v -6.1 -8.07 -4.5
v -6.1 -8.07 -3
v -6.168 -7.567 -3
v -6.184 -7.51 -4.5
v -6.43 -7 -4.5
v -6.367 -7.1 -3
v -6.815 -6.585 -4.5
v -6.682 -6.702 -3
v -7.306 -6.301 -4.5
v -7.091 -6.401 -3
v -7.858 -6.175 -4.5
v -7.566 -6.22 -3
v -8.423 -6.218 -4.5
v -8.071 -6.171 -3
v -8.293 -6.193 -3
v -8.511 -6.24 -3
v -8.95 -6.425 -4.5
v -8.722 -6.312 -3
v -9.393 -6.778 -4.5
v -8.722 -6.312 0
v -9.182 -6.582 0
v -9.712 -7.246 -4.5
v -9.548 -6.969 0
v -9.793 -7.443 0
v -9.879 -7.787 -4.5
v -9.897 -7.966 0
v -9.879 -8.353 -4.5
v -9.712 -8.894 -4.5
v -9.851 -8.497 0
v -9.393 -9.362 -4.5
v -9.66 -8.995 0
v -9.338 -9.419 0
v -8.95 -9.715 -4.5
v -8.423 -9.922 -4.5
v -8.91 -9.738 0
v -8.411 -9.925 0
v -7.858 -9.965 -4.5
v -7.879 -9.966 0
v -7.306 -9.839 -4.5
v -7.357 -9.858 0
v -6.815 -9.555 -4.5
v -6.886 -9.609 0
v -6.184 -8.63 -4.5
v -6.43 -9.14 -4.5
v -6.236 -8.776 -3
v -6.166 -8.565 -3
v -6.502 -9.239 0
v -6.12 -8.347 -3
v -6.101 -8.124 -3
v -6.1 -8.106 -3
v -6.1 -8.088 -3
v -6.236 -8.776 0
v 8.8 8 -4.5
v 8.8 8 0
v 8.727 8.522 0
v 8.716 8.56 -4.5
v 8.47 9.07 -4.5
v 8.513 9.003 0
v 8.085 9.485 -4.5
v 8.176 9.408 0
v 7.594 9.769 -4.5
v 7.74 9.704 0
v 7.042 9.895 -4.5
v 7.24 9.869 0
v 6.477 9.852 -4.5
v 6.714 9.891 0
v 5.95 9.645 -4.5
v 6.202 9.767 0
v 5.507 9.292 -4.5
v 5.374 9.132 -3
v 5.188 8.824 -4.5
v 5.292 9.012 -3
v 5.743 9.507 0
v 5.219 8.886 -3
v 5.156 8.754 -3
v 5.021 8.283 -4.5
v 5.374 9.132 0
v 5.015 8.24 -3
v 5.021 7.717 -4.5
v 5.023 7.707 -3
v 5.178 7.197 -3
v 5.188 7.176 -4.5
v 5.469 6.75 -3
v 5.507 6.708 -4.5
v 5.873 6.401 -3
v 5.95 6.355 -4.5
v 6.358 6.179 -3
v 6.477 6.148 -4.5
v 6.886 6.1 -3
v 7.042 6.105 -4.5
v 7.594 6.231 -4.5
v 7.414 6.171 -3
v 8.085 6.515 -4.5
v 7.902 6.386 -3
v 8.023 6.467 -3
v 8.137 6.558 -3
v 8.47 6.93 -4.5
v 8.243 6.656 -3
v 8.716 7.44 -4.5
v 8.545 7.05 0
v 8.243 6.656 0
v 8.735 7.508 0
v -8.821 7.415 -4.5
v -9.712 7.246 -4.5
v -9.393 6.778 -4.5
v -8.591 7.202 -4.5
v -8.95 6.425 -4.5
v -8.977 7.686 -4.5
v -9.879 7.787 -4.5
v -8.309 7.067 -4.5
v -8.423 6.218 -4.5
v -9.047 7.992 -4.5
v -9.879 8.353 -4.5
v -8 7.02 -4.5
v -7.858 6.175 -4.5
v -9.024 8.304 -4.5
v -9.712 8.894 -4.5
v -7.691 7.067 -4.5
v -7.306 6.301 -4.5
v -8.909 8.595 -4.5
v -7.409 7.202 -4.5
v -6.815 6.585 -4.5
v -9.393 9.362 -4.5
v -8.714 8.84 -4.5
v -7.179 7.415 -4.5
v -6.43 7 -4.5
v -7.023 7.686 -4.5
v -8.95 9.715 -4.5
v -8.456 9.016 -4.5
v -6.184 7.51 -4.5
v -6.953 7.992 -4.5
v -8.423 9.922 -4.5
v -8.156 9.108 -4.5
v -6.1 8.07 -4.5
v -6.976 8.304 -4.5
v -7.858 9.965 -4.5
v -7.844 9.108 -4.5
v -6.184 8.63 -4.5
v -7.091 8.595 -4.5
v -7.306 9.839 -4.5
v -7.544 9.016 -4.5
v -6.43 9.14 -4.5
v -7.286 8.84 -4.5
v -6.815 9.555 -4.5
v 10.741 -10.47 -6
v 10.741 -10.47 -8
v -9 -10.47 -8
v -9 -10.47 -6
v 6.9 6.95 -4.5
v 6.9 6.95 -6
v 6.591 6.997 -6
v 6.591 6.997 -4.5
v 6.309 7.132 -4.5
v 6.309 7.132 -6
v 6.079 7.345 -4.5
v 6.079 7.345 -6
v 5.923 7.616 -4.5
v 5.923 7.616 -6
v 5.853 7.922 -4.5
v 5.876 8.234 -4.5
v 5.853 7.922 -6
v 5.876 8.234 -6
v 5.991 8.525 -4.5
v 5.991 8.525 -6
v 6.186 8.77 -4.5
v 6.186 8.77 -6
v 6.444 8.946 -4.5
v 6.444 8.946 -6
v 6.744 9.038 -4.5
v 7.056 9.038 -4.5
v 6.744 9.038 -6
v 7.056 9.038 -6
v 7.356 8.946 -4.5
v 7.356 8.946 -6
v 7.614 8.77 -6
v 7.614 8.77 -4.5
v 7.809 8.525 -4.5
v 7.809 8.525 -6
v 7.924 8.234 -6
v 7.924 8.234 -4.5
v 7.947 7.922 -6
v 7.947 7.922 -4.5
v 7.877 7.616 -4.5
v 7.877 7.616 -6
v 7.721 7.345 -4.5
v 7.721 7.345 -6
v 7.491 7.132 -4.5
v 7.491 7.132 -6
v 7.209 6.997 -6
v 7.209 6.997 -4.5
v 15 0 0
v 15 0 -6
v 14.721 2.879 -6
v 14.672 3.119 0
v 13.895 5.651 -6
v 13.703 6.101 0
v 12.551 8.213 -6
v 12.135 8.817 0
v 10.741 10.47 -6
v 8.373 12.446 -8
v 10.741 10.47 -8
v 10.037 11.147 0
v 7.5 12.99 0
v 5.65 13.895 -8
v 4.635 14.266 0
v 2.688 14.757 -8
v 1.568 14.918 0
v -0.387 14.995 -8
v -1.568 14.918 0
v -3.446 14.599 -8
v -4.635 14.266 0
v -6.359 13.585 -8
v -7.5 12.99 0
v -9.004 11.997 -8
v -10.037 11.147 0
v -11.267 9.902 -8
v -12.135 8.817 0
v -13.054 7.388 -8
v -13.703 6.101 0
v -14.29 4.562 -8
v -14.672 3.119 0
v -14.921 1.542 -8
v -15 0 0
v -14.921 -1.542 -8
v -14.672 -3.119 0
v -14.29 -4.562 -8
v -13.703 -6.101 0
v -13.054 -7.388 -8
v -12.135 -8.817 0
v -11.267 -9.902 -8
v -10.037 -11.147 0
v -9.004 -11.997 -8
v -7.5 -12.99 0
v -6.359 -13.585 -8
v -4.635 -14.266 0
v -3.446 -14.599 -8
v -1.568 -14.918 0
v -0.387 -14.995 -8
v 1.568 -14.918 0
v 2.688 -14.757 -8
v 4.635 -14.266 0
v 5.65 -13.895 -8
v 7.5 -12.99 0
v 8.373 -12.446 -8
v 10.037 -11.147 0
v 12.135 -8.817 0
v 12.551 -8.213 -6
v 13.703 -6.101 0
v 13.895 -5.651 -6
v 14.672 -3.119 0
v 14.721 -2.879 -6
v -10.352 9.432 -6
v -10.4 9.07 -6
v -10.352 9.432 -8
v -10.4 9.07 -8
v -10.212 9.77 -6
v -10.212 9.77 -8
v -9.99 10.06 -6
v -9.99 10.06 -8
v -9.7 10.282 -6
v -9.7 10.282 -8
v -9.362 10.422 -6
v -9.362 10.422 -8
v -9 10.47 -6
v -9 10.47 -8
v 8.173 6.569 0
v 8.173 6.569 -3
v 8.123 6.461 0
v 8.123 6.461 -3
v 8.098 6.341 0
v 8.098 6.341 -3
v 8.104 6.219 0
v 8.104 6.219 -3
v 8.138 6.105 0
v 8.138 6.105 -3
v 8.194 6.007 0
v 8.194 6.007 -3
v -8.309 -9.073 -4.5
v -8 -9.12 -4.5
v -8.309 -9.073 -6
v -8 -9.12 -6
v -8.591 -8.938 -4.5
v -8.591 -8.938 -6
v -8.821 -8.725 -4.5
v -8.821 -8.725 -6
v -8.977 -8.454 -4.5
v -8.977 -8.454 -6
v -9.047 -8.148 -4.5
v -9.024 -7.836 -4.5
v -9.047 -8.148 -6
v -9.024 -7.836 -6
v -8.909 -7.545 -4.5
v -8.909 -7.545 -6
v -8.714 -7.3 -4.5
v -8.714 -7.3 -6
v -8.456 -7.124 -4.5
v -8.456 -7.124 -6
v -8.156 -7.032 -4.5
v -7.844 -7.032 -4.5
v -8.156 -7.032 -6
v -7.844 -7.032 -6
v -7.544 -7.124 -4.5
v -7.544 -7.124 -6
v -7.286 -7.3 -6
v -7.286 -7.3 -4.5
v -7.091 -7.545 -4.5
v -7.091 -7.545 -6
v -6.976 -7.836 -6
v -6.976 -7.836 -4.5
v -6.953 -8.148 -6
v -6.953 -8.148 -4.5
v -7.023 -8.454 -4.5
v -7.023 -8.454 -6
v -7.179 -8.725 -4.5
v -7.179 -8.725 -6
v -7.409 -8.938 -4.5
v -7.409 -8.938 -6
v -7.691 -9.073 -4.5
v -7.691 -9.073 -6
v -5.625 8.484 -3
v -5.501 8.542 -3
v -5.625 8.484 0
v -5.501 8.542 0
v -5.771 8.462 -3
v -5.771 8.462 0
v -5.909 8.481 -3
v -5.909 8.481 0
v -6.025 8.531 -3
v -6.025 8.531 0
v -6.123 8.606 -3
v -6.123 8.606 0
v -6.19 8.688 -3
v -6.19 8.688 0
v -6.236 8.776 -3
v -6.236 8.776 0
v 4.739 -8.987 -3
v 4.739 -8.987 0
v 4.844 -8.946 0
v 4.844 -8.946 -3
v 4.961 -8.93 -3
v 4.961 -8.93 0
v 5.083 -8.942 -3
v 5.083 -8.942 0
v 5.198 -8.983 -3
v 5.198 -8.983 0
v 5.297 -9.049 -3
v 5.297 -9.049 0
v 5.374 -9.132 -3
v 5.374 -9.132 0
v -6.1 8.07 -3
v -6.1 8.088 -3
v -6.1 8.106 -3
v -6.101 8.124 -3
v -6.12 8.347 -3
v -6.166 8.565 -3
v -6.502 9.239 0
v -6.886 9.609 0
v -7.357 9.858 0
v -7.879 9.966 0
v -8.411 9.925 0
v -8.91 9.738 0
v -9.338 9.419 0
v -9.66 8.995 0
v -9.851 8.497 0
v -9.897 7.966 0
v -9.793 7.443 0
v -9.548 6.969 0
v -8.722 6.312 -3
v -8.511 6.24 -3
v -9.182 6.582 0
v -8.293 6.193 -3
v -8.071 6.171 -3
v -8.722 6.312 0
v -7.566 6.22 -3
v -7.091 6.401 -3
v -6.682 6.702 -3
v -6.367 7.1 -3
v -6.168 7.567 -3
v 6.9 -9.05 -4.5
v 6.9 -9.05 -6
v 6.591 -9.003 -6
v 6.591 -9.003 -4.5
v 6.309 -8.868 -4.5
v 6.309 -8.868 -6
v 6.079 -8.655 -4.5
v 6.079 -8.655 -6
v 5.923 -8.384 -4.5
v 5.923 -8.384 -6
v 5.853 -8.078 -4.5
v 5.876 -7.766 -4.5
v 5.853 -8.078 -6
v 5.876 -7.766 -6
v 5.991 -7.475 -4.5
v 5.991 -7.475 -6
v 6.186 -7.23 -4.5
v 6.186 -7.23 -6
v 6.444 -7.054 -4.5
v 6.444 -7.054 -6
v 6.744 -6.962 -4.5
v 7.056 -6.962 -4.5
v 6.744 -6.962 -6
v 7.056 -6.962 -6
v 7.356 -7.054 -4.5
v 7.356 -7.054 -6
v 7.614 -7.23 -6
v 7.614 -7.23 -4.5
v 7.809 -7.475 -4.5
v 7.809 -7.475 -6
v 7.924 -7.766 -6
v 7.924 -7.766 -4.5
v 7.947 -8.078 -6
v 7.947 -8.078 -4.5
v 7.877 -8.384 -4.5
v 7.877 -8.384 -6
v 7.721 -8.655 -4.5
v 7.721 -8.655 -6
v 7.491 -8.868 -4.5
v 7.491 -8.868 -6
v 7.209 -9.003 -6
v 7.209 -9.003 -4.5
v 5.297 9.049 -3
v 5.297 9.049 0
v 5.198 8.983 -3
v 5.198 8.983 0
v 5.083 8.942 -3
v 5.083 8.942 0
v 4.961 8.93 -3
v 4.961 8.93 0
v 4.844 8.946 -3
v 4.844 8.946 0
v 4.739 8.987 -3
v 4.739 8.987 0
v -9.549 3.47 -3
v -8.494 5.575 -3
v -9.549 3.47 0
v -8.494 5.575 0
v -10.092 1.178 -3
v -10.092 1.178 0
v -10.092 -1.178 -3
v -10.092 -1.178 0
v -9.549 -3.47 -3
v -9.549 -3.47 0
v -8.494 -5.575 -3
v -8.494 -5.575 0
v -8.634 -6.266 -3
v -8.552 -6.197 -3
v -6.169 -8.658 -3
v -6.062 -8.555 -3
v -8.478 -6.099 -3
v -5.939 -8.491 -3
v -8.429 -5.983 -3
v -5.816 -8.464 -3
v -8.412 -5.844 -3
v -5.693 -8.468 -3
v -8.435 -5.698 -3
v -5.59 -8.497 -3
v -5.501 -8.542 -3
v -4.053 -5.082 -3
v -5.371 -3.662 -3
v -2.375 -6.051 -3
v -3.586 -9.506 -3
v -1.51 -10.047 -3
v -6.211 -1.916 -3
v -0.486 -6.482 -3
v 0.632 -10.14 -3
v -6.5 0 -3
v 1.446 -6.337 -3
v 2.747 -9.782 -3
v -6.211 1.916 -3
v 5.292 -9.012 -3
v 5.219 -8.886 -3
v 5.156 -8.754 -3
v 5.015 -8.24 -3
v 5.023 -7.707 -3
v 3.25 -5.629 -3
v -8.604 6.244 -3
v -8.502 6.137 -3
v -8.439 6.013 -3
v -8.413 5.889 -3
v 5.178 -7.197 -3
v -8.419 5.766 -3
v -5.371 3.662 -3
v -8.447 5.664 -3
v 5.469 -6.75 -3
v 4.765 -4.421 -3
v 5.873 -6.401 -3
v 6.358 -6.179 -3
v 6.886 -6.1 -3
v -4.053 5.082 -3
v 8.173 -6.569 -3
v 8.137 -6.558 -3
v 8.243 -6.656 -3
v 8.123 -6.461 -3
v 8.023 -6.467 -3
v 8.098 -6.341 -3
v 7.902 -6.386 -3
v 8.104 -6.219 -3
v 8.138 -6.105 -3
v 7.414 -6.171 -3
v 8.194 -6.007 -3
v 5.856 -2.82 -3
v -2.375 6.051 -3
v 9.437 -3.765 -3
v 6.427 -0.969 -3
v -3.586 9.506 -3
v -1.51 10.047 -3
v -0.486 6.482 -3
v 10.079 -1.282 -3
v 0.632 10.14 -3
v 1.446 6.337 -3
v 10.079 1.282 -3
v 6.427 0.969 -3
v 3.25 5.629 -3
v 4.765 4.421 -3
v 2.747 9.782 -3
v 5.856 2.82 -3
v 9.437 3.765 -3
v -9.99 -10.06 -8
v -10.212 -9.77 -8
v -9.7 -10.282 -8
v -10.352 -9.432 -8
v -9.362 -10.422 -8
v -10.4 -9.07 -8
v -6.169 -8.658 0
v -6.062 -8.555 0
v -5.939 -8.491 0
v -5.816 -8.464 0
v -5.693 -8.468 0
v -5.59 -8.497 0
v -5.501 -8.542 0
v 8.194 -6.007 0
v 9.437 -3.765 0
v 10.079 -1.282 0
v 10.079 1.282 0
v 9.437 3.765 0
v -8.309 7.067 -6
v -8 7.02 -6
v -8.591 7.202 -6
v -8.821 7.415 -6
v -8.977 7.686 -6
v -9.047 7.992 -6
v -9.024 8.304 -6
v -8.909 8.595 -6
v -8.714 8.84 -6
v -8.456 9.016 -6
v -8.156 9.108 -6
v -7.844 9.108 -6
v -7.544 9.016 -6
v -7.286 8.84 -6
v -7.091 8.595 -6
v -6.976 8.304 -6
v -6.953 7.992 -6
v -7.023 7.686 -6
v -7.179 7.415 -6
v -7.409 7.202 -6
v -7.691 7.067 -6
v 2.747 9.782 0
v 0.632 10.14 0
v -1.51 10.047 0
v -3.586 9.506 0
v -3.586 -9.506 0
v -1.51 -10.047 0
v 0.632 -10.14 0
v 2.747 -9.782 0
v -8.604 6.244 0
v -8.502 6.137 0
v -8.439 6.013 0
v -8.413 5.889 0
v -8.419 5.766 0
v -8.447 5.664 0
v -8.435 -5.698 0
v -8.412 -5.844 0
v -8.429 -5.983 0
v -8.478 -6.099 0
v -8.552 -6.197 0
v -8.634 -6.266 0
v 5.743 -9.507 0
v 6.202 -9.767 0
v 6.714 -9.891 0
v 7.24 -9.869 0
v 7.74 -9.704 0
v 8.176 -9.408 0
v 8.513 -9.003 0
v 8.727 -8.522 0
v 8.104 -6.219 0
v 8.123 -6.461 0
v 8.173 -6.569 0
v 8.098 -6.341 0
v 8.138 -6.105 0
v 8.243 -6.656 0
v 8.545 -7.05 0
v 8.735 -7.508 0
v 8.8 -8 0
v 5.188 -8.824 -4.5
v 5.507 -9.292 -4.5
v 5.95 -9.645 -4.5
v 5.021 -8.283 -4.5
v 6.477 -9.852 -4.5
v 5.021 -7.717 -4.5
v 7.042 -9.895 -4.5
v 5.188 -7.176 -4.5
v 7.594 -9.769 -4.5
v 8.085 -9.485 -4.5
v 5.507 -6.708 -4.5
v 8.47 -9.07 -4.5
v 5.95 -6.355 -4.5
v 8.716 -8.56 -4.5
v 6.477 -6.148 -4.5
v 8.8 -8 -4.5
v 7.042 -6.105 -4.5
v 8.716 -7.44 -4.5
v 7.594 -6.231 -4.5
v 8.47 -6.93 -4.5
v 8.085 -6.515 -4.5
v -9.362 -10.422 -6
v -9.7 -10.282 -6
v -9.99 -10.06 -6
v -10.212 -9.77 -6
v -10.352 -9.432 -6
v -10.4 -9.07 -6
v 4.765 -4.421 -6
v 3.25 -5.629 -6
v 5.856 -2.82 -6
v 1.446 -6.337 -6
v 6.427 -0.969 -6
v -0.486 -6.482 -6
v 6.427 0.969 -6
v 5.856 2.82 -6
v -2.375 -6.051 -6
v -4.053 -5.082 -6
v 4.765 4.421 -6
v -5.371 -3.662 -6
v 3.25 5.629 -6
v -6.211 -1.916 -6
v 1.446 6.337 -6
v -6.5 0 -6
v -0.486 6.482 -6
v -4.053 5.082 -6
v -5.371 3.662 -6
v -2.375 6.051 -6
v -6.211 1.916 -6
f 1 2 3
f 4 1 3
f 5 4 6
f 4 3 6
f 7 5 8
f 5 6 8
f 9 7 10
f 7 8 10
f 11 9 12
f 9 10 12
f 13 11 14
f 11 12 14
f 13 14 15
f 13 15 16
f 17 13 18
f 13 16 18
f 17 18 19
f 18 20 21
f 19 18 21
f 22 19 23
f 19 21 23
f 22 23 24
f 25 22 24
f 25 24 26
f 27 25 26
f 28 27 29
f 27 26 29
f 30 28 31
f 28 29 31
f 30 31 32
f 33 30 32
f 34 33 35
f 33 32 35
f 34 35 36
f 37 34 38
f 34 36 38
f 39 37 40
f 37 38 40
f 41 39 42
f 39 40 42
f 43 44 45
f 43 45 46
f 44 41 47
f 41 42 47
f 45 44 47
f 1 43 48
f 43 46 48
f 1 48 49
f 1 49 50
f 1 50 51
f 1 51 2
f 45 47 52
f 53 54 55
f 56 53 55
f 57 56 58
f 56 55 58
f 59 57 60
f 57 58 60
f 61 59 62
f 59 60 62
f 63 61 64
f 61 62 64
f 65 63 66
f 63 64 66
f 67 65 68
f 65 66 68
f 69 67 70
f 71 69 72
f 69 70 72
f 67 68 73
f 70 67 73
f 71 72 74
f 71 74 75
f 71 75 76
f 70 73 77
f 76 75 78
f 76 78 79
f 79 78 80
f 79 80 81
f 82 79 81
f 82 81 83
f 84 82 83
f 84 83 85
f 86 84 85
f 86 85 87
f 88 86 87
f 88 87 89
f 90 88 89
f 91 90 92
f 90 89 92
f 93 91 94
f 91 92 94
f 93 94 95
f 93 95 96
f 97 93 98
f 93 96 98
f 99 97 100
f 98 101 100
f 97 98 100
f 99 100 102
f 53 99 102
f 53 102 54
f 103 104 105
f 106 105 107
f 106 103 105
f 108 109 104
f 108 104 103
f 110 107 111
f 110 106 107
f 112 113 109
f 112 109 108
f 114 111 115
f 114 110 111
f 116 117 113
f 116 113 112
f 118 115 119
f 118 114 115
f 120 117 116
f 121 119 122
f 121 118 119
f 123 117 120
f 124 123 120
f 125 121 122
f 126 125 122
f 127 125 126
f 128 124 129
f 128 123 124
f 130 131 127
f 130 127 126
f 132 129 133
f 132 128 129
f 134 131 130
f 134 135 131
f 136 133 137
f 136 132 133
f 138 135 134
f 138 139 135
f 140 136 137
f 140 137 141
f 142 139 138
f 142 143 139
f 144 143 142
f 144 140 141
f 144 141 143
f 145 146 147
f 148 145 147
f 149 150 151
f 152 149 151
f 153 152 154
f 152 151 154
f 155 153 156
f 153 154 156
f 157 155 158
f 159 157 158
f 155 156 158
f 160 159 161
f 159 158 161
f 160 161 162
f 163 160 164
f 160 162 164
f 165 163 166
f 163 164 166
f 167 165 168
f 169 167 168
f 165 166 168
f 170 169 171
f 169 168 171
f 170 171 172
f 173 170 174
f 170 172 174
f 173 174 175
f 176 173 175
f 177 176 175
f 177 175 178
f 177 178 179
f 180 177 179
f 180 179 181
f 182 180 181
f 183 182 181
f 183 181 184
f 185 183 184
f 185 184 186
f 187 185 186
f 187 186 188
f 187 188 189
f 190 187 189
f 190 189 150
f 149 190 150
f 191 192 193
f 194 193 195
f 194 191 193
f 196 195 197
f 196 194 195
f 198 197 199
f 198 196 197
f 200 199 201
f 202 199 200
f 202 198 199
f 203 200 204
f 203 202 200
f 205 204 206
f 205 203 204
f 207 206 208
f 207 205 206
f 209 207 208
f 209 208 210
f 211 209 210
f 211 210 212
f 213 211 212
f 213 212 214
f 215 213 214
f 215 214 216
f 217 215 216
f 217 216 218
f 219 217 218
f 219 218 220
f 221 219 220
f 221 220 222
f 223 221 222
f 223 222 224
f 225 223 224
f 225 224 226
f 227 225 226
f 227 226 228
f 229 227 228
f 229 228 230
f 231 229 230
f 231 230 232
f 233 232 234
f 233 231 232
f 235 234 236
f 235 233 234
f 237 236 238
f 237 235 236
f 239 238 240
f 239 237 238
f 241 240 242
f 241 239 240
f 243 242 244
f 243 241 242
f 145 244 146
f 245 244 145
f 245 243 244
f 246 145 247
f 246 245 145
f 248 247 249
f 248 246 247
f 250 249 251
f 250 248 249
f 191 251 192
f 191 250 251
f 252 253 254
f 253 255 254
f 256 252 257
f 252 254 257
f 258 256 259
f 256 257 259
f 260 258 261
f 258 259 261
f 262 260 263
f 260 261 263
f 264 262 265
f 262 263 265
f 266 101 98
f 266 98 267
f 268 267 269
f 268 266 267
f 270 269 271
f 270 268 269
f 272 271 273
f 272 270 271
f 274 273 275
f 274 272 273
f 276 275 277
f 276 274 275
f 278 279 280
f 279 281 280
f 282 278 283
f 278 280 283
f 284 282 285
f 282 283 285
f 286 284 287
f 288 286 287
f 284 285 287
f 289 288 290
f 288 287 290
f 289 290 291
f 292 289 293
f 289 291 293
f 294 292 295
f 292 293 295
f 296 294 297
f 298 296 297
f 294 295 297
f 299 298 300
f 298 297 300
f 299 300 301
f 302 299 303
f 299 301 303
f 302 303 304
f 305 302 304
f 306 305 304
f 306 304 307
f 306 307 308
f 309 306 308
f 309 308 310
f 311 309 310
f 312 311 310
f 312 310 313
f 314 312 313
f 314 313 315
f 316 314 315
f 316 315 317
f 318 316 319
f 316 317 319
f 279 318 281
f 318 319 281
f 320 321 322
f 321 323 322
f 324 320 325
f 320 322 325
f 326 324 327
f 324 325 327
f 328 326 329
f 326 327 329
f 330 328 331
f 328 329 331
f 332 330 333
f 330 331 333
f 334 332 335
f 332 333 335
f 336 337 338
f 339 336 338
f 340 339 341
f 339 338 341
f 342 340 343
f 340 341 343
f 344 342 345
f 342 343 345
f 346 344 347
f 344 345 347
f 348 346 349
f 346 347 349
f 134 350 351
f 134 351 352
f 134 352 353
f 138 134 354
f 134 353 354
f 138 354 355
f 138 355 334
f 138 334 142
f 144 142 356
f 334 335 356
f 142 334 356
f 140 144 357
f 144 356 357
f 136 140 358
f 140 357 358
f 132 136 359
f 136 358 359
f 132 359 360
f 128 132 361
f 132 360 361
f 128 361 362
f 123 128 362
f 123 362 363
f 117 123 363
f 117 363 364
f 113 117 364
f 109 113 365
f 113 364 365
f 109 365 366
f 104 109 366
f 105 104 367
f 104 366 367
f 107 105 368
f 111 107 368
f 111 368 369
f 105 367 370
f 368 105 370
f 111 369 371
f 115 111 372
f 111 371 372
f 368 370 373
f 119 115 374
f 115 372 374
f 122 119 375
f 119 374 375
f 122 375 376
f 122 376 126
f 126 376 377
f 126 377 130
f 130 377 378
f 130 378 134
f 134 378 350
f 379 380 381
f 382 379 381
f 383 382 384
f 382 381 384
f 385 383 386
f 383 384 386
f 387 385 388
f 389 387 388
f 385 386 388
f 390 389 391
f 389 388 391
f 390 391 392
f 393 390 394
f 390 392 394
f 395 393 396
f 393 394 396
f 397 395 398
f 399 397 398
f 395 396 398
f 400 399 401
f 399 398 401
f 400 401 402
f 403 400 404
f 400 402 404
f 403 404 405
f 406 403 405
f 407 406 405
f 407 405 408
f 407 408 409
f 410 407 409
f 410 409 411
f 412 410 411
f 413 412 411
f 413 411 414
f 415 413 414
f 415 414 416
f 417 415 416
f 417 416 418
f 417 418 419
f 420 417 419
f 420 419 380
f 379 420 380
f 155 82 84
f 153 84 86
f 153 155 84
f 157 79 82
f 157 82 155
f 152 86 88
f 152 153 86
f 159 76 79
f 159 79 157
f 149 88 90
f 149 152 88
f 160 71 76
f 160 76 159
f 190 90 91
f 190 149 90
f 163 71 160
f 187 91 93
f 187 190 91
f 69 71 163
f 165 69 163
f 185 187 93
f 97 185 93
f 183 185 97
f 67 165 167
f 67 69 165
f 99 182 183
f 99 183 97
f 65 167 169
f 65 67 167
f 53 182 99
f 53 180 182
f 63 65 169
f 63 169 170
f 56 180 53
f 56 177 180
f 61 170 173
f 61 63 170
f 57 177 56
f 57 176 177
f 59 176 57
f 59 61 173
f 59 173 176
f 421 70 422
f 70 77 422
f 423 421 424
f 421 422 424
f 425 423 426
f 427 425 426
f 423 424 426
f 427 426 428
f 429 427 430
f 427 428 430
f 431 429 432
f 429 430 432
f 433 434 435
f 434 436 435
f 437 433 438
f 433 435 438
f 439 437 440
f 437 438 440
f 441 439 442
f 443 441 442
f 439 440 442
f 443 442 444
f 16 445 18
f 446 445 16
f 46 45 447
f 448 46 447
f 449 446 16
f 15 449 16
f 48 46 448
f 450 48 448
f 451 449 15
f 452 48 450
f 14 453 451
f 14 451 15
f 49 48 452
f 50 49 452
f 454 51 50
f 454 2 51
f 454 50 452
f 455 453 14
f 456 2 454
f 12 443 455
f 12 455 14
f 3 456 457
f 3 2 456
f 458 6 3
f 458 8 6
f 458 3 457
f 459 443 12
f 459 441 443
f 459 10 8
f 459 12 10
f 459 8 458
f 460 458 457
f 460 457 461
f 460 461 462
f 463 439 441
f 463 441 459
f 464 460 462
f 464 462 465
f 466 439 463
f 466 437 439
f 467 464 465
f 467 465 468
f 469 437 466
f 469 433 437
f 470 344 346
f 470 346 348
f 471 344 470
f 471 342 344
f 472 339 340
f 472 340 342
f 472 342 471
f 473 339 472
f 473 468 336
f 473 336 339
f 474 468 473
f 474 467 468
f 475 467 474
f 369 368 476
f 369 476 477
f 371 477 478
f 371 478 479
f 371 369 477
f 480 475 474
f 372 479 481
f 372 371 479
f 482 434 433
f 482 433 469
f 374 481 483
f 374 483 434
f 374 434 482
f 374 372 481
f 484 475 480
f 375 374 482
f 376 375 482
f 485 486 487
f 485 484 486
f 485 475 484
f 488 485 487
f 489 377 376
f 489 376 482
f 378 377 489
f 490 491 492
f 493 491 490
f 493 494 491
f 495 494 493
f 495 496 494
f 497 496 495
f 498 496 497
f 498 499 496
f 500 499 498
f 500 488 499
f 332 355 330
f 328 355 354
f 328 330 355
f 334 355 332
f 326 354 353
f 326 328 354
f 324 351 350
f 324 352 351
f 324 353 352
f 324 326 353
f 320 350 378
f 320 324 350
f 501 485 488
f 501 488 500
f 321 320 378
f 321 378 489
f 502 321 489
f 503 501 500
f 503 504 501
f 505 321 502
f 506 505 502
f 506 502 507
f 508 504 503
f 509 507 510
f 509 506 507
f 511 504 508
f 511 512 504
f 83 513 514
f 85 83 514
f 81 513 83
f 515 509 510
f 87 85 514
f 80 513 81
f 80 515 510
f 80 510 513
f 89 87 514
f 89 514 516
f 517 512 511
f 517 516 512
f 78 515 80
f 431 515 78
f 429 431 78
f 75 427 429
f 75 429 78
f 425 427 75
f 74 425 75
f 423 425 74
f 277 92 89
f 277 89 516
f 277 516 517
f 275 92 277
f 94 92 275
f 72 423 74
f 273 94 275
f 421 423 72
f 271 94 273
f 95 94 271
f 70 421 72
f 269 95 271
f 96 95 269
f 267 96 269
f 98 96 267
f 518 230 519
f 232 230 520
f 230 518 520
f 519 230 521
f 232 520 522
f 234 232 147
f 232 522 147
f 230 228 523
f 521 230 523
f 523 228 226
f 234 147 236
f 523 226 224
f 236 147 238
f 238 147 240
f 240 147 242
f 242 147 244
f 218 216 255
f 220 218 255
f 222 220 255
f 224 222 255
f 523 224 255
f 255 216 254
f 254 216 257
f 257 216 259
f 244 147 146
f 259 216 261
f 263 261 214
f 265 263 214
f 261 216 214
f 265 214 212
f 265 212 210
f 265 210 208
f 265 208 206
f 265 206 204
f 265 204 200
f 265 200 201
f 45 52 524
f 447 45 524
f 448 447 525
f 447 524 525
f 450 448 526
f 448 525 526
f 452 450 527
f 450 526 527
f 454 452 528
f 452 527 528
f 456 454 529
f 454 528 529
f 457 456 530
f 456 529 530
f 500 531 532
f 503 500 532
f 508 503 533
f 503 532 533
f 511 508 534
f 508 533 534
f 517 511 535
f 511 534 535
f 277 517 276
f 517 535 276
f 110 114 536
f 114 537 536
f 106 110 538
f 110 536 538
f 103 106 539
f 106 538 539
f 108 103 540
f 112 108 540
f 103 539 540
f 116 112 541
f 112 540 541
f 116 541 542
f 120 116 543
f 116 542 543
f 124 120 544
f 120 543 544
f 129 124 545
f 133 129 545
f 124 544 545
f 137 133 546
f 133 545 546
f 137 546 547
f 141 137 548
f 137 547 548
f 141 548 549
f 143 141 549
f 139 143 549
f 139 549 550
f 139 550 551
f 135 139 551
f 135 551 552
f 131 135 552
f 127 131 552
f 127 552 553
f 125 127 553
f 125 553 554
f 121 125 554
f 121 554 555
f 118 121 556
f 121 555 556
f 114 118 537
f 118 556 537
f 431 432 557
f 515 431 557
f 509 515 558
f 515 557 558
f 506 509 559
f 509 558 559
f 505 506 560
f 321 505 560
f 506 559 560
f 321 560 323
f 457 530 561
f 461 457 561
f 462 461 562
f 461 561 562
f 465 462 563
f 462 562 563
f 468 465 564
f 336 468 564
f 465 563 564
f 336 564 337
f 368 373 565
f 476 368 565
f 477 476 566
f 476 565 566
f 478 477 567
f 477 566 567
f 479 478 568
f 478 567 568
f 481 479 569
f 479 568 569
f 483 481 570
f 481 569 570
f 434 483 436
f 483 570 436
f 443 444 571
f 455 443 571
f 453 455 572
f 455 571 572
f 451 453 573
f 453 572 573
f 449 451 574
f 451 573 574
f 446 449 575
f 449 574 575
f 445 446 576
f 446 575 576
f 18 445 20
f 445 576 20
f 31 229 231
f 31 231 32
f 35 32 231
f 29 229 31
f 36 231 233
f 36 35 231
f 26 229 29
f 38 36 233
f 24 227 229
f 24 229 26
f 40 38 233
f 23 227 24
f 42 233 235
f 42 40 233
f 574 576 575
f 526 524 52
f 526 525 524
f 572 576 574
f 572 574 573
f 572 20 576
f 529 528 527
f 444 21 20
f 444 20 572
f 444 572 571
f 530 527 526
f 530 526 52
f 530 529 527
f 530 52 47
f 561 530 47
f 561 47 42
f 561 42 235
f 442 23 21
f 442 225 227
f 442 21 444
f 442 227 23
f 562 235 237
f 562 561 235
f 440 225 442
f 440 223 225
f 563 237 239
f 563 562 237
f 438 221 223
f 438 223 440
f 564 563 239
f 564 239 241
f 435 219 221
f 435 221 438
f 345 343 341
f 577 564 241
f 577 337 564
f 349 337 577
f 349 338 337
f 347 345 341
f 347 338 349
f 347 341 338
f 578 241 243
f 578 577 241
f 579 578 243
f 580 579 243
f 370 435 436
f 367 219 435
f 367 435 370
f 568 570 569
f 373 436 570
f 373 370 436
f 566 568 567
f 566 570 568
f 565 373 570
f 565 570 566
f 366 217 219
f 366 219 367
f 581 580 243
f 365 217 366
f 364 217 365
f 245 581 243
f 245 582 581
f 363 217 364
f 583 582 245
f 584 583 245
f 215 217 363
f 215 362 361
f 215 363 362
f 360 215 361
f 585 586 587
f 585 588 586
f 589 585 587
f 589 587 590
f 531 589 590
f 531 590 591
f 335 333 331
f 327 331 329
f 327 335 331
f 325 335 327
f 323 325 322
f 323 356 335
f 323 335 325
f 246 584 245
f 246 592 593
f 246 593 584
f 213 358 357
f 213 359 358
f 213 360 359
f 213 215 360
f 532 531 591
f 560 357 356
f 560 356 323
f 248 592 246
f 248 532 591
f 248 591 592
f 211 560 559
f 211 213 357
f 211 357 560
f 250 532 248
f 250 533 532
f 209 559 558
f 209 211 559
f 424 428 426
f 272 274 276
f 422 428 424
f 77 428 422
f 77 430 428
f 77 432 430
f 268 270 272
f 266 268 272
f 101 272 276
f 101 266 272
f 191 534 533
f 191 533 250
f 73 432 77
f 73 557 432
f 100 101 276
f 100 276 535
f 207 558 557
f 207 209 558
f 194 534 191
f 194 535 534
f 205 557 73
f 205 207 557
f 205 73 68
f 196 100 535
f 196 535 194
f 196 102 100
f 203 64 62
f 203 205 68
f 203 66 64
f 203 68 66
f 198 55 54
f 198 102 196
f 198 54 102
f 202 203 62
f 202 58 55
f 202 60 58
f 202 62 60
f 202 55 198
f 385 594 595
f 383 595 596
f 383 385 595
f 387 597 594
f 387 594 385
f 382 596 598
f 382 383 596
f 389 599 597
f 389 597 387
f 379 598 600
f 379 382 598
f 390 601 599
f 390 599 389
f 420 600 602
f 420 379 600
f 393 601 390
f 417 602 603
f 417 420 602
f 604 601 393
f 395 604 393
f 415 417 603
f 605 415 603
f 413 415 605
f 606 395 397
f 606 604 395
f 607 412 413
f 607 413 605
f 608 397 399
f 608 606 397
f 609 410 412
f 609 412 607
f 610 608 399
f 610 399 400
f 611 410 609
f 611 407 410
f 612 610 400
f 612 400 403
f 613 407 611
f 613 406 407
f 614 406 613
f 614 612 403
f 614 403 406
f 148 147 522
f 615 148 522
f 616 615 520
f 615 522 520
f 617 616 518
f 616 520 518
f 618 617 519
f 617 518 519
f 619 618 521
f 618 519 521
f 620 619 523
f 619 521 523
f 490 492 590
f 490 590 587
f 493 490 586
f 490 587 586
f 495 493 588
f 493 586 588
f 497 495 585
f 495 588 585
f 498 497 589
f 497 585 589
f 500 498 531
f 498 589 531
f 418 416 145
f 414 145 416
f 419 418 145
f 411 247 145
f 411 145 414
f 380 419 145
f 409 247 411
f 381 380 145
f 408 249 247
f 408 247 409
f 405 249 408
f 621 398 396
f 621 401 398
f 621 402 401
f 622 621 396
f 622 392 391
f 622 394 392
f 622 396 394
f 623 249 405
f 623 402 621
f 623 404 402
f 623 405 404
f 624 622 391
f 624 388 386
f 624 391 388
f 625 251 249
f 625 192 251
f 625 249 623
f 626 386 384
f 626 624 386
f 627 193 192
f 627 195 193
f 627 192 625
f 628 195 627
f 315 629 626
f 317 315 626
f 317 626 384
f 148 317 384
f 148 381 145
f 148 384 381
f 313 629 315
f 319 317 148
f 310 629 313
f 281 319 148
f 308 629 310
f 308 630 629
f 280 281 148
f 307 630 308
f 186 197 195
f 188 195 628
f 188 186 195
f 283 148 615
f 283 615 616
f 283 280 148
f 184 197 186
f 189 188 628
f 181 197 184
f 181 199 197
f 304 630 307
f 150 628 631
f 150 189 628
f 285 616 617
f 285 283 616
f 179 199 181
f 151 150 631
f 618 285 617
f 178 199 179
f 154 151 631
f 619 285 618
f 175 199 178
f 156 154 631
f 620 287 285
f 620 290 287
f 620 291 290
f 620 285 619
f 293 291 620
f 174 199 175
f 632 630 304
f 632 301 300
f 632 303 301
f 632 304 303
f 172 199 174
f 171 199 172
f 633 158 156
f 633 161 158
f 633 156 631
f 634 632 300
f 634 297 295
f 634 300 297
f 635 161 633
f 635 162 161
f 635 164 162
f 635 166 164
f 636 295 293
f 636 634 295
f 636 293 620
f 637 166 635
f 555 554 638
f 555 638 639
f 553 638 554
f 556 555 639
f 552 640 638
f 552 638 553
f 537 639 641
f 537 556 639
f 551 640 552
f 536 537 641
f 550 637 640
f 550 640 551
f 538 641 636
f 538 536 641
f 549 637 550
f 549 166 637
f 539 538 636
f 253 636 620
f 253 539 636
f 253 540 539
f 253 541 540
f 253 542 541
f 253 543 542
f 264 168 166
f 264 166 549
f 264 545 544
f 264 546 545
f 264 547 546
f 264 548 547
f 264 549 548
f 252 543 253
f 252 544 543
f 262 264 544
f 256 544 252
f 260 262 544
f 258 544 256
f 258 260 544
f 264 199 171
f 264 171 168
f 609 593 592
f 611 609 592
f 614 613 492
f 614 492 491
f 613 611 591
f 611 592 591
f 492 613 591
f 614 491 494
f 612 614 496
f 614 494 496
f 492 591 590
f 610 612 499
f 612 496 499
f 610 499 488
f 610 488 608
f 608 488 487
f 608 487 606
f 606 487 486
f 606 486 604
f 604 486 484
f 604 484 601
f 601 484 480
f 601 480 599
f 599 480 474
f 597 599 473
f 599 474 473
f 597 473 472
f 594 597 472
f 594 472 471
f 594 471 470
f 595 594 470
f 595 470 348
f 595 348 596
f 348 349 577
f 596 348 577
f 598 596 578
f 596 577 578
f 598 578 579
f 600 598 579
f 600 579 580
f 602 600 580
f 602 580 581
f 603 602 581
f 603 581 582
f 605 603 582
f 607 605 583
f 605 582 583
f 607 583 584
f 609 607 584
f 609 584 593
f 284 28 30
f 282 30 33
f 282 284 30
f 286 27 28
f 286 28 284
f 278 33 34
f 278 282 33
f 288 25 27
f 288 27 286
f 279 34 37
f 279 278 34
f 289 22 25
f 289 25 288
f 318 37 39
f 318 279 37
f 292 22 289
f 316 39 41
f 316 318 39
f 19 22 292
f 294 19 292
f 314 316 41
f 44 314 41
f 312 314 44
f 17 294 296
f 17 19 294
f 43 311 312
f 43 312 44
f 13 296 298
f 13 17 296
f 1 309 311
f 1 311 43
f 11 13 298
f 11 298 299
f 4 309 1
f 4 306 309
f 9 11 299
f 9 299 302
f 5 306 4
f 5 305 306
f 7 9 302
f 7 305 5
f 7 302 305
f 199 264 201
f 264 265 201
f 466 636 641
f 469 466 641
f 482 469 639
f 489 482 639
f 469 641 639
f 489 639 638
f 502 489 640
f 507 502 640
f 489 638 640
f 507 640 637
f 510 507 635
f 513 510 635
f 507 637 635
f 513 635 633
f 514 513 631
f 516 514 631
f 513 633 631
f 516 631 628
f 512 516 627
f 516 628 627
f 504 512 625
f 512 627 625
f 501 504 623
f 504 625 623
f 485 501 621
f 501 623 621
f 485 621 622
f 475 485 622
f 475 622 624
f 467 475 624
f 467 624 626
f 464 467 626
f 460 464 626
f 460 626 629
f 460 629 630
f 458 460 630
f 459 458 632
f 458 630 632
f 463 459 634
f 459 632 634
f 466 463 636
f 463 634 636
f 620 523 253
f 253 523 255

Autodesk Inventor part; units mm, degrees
ref_plane "YZ Plane" through (0, 0, 0) normal (1, 0, 0) x (0, 1, 0)
ref_plane "XZ Plane" through (0, 0, 0) normal (0, 1, 0) x (-1, 0, 0)
ref_plane "XY Plane" through (0, 0, 0) normal (0, 0, 1) x (1, 0, 0)
sketch "Sketch8" plane through (0, 0, 0) normal (0, 0, 1) x (1, 0, 0)
  circle A0 centre (0, 0) radius 15
  dimension "d33" = 30
extrude "Extrusion7" add sketch "Sketch8" against normal blind 8
sketch "Sketch10" plane through (0, 0, -8) normal (0, 0, -1) x (-1, 0, 0)
  line L0 (9, 10.07) -> (-29.1, 10.07)
  arc A0 (10, 9.07) -> (9, 10.07) centre (9, 9.07) ccw
  line L1 (10, 9.07) -> (10, -9.07)
  arc A1 (9, -10.07) -> (10, -9.07) centre (9, -9.07) ccw
  line L2 (-29.1, -10.07) -> (9, -10.07)
  line L3 (-29.1, 10.07) -> (-29.1, -10.07)
  arc A2 (9, -10.47) -> (10.4, -9.07) centre (9, -9.07) ccw
  line L4 (10.4, -9.07) -> (10.4, 9.07)
  arc A3 (10.4, 9.07) -> (9, 10.47) centre (9, 9.07) ccw
  line L5 (9, 10.47) -> (-29.5, 10.47)
  line L6 (-29.5, 10.47) -> (-29.5, -10.47)
  line L7 (-29.5, -10.47) -> (9, -10.47)
  dimension "d59" = 0.4
extrude "Extrusion8" cut sketch "Sketch10" against normal blind 2 contours A0 L1 A1 L2 L3 L0 | L7 L6 L5 A3 L4 A2
sketch "Sketch11" plane through (0, 0, -6) normal (0, 0, -1) x (-1, 0, 0)
  circle A0 centre (0, 0) radius 6.4
  circle A1 centre (0, 0) radius 6.5
  point P0 (0, 0)
  dimension "d58" = 13
extrude "Extrusion9" cut sketch "Sketch11" against normal through all contours A0 | A1
sketch "Sketch13" plane through (0, 0, 0) normal (0, 0, 1) x (1, 0, 0)
  circle A0 centre (0, 0) radius 9.96
  circle A1 centre (0, 0) radius 10.16
  point P0 (0, 0)
  dimension "d44" = 0.2
extrude "Extrusion11" cut sketch "Sketch13" against normal blind 3 contours A0 | A1
sketch "Sketch14" plane through (0, 0, 0) normal (0, 0, 1) x (1, 0, 0)
  circle A0 centre (6.9, 8) radius 0.7835
  circle A1 centre (6.9, -8) radius 0.7835
  circle A2 centre (-8, 8.07) radius 1
  circle A3 centre (-8, -8.07) radius 1
  point P0 (0, 0)
hole "Hole2" at (6.9, 8, 0) at (-8, 8.07, 0) at (-8, -8.07, 0) at (6.9, -8, 0) direction (0, 0, -1) diameter 2.1 end through all
sketch "Sketch15" plane through (0, 0, 0) normal (0, 0, 1) x (1, 0, 0)
  arc A0 (7.3255, 7.0401) -> (5.888, 8.2799) centre (6.9, 8) ccw projected
  arc A1 (5.888, -8.2799) -> (7.3255, -7.0401) centre (6.9, -8) ccw projected
  circle A2 centre (-8, 8.07) radius 1.05 projected
  circle A3 centre (-8, -8.07) radius 1.05 projected
  circle A4 centre (6.9, 8) radius 1.9
  circle A5 centre (6.9, -8) radius 1.9
  circle A6 centre (-8, -8.07) radius 1.9
  circle A7 centre (-8, 8.07) radius 1.9
  point P0 (0, 0)
  dimension "d54" = 3.8
extrude "Extrusion12" cut sketch "Sketch15" against normal blind 4.5 contours A2 | A3 | A4 | A5 | A6 | A7
fillet "Fillet2" radius 0.5 8 edges at (5.1562, 8.7544, -1.5) (7.9023, 6.3859, -1.5) (-6.1008, 8.1244, -1.5) (-8.071, 6.1713, -1.5) (-8.071, -6.1713, -1.5) (-6.1008, -8.1244, -1.5) (5.1562, -8.7544, -1.5) (7.9023, -6.3859, -1.5)
properties part number "axis_4_top_frame" material "Aluminum 6061-AHC"
